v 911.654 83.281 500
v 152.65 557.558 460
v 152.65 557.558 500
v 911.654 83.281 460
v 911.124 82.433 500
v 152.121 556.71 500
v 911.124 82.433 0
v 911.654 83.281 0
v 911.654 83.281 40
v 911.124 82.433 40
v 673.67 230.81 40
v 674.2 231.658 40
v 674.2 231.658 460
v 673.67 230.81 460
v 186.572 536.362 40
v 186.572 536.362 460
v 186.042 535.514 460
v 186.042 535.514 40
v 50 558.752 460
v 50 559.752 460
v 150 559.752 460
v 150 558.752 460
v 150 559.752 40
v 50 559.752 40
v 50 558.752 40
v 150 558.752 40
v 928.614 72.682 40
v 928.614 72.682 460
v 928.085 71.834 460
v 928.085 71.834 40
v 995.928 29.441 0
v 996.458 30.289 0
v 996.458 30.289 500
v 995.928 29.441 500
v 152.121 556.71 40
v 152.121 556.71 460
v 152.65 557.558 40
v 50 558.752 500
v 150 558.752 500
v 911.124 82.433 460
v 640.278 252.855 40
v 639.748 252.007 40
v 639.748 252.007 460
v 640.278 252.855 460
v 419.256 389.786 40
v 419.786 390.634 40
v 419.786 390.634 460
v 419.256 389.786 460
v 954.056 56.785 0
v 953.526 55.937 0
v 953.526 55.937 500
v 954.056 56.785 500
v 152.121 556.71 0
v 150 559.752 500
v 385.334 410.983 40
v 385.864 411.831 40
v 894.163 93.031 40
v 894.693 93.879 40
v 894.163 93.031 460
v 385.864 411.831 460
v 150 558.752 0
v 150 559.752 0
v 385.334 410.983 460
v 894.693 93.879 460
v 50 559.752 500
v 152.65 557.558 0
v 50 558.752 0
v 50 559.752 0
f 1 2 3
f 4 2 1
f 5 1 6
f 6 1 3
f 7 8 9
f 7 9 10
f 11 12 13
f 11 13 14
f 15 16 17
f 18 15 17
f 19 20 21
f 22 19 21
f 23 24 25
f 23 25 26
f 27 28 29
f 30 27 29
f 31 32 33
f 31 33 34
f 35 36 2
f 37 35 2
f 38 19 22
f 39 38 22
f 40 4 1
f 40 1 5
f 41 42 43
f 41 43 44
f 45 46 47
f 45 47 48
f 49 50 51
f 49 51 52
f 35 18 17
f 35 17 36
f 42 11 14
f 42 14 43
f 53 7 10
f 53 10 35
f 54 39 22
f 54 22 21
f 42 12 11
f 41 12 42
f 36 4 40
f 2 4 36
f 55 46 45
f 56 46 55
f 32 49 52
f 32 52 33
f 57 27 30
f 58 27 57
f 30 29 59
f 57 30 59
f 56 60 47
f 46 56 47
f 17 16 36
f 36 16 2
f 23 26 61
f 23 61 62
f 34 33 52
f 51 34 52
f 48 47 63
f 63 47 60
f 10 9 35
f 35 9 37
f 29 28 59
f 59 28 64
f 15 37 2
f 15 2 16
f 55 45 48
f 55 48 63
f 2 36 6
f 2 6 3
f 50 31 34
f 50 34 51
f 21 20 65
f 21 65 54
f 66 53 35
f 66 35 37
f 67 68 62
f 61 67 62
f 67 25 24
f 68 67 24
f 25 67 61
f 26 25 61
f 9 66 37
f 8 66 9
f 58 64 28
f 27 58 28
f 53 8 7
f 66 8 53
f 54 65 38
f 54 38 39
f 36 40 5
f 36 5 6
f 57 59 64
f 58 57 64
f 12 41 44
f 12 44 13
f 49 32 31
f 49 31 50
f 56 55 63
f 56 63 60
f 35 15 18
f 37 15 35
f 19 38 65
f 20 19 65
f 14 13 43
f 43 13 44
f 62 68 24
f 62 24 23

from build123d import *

# Parameters (mm, degrees)
RAIL_SEAT_1_EPDM_T1_DEPTH     = 40
SKETCH_2_W                    = 100
SKETCH_2_H                    = 1
PLATFORM_SEAT_1_EPDM_T1_DEPTH = 40
RAIL_SEAT_2_EPDM_T1_START     = 460
RAIL_SEAT_2_EPDM_T1_DEPTH     = 40
PLATFORM_SEAT_2_EPDM_T1_START = 460
SKETCH_4_W                    = 100
SKETCH_4_H                    = 1
PLATFORM_SEAT_2_EPDM_T1_DEPTH = 40
TOE_SEAT_EPDM_T1_DEPTH        = 500
CROSS_SEAT_S25_EPDM_T1_START  = 40
CROSS_SEAT_S25_EPDM_T1_DEPTH  = 420
CROSS_SEAT_S300_EPDM_T1_START = 40
CROSS_SEAT_S300_EPDM_T1_DEPTH = 420
CROSS_SEAT_S600_EPDM_T1_START = 40
CROSS_SEAT_S600_EPDM_T1_DEPTH = 420
CROSS_SEAT_S900_EPDM_T1_START = 40
CROSS_SEAT_S900_EPDM_T1_DEPTH = 420


with BuildPart() as part:
    # 草图1 → Rail_seat_1_EPDM_t1 (new body)
    with BuildSketch(Plane.XY):
        Polygon((152.650482688, 557.558387489), (911.653528748, 83.280646), (911.123609484, 82.432597904), (152.120563424, 556.710339393), align=None)
    extrude(amount=RAIL_SEAT_1_EPDM_T1_DEPTH)


with BuildPart() as body_2:
    # 草图2 → Platform_seat_1_EPDM_t1 (new body)
    with BuildSketch(Plane.XY):
        with Locations((100, 559.252128099)):
            Rectangle(SKETCH_2_W, SKETCH_2_H)
    extrude(amount=PLATFORM_SEAT_1_EPDM_T1_DEPTH)


with BuildPart() as body_3:
    # 草图3 → Rail_seat_2_EPDM_t1 (new body)
    with BuildSketch(Plane.XY.offset(RAIL_SEAT_2_EPDM_T1_START)):
        Polygon((152.650482688, 557.558387489), (911.653528748, 83.280646), (911.123609484, 82.432597904), (152.120563424, 556.710339393), align=None)
    extrude(amount=RAIL_SEAT_2_EPDM_T1_DEPTH)


with BuildPart() as body_4:
    # 草图4 → Platform_seat_2_EPDM_t1 (new body)
    with BuildSketch(Plane.XY.offset(PLATFORM_SEAT_2_EPDM_T1_START)):
        with Locations((100, 559.252128099)):
            Rectangle(SKETCH_4_W, SKETCH_4_H)
    extrude(amount=PLATFORM_SEAT_2_EPDM_T1_DEPTH)


with BuildPart() as body_5:
    # 草图5 → Toe_seat_EPDM_t1 (new body)
    with BuildSketch(Plane.XY):
        Polygon((954.055933556, 56.784682789), (996.458338364, 30.288719577), (995.928419099, 29.440671481), (953.526014292, 55.936634693), align=None)
    extrude(amount=TOE_SEAT_EPDM_T1_DEPTH)


with BuildPart() as body_6:
    # 草图6 → Cross_seat_s25_EPDM_t1 (new body)
    with BuildSketch(Plane.XY.offset(CROSS_SEAT_S25_EPDM_T1_START)):
        Polygon((152.650482688, 557.558387489), (186.572406534, 536.36161692), (186.04248727, 535.513568824), (152.120563424, 556.710339393), align=None)
    extrude(amount=CROSS_SEAT_S25_EPDM_T1_DEPTH)


with BuildPart() as body_7:
    # 草图7 → Cross_seat_s300_EPDM_t1 (new body)
    with BuildSketch(Plane.XY.offset(CROSS_SEAT_S300_EPDM_T1_START)):
        Polygon((385.863709131, 411.830589825), (419.785632977, 390.633819256), (419.255713713, 389.785771159), (385.333789867, 410.982541729), align=None)
    extrude(amount=CROSS_SEAT_S300_EPDM_T1_DEPTH)


with BuildPart() as body_8:
    # 草图8 → Cross_seat_s600_EPDM_t1 (new body)
    with BuildSketch(Plane.XY.offset(CROSS_SEAT_S600_EPDM_T1_START)):
        Polygon((640.278137978, 252.854810555), (674.200061824, 231.658039986), (673.67014256, 230.80999189), (639.748218714, 252.006762459), align=None)
    extrude(amount=CROSS_SEAT_S600_EPDM_T1_DEPTH)


with BuildPart() as body_9:
    # 草图9 → Cross_seat_s900_EPDM_t1 (new body)
    with BuildSketch(Plane.XY.offset(CROSS_SEAT_S900_EPDM_T1_START)):
        Polygon((894.692566825, 93.879031285), (928.614490671, 72.682260716), (928.084571407, 71.83421262), (894.162647561, 93.030983189), align=None)
    extrude(amount=CROSS_SEAT_S900_EPDM_T1_DEPTH)


solid = Compound([part.part, body_2.part, body_3.part, body_4.part, body_5.part, body_6.part, body_7.part, body_8.part, body_9.part])
